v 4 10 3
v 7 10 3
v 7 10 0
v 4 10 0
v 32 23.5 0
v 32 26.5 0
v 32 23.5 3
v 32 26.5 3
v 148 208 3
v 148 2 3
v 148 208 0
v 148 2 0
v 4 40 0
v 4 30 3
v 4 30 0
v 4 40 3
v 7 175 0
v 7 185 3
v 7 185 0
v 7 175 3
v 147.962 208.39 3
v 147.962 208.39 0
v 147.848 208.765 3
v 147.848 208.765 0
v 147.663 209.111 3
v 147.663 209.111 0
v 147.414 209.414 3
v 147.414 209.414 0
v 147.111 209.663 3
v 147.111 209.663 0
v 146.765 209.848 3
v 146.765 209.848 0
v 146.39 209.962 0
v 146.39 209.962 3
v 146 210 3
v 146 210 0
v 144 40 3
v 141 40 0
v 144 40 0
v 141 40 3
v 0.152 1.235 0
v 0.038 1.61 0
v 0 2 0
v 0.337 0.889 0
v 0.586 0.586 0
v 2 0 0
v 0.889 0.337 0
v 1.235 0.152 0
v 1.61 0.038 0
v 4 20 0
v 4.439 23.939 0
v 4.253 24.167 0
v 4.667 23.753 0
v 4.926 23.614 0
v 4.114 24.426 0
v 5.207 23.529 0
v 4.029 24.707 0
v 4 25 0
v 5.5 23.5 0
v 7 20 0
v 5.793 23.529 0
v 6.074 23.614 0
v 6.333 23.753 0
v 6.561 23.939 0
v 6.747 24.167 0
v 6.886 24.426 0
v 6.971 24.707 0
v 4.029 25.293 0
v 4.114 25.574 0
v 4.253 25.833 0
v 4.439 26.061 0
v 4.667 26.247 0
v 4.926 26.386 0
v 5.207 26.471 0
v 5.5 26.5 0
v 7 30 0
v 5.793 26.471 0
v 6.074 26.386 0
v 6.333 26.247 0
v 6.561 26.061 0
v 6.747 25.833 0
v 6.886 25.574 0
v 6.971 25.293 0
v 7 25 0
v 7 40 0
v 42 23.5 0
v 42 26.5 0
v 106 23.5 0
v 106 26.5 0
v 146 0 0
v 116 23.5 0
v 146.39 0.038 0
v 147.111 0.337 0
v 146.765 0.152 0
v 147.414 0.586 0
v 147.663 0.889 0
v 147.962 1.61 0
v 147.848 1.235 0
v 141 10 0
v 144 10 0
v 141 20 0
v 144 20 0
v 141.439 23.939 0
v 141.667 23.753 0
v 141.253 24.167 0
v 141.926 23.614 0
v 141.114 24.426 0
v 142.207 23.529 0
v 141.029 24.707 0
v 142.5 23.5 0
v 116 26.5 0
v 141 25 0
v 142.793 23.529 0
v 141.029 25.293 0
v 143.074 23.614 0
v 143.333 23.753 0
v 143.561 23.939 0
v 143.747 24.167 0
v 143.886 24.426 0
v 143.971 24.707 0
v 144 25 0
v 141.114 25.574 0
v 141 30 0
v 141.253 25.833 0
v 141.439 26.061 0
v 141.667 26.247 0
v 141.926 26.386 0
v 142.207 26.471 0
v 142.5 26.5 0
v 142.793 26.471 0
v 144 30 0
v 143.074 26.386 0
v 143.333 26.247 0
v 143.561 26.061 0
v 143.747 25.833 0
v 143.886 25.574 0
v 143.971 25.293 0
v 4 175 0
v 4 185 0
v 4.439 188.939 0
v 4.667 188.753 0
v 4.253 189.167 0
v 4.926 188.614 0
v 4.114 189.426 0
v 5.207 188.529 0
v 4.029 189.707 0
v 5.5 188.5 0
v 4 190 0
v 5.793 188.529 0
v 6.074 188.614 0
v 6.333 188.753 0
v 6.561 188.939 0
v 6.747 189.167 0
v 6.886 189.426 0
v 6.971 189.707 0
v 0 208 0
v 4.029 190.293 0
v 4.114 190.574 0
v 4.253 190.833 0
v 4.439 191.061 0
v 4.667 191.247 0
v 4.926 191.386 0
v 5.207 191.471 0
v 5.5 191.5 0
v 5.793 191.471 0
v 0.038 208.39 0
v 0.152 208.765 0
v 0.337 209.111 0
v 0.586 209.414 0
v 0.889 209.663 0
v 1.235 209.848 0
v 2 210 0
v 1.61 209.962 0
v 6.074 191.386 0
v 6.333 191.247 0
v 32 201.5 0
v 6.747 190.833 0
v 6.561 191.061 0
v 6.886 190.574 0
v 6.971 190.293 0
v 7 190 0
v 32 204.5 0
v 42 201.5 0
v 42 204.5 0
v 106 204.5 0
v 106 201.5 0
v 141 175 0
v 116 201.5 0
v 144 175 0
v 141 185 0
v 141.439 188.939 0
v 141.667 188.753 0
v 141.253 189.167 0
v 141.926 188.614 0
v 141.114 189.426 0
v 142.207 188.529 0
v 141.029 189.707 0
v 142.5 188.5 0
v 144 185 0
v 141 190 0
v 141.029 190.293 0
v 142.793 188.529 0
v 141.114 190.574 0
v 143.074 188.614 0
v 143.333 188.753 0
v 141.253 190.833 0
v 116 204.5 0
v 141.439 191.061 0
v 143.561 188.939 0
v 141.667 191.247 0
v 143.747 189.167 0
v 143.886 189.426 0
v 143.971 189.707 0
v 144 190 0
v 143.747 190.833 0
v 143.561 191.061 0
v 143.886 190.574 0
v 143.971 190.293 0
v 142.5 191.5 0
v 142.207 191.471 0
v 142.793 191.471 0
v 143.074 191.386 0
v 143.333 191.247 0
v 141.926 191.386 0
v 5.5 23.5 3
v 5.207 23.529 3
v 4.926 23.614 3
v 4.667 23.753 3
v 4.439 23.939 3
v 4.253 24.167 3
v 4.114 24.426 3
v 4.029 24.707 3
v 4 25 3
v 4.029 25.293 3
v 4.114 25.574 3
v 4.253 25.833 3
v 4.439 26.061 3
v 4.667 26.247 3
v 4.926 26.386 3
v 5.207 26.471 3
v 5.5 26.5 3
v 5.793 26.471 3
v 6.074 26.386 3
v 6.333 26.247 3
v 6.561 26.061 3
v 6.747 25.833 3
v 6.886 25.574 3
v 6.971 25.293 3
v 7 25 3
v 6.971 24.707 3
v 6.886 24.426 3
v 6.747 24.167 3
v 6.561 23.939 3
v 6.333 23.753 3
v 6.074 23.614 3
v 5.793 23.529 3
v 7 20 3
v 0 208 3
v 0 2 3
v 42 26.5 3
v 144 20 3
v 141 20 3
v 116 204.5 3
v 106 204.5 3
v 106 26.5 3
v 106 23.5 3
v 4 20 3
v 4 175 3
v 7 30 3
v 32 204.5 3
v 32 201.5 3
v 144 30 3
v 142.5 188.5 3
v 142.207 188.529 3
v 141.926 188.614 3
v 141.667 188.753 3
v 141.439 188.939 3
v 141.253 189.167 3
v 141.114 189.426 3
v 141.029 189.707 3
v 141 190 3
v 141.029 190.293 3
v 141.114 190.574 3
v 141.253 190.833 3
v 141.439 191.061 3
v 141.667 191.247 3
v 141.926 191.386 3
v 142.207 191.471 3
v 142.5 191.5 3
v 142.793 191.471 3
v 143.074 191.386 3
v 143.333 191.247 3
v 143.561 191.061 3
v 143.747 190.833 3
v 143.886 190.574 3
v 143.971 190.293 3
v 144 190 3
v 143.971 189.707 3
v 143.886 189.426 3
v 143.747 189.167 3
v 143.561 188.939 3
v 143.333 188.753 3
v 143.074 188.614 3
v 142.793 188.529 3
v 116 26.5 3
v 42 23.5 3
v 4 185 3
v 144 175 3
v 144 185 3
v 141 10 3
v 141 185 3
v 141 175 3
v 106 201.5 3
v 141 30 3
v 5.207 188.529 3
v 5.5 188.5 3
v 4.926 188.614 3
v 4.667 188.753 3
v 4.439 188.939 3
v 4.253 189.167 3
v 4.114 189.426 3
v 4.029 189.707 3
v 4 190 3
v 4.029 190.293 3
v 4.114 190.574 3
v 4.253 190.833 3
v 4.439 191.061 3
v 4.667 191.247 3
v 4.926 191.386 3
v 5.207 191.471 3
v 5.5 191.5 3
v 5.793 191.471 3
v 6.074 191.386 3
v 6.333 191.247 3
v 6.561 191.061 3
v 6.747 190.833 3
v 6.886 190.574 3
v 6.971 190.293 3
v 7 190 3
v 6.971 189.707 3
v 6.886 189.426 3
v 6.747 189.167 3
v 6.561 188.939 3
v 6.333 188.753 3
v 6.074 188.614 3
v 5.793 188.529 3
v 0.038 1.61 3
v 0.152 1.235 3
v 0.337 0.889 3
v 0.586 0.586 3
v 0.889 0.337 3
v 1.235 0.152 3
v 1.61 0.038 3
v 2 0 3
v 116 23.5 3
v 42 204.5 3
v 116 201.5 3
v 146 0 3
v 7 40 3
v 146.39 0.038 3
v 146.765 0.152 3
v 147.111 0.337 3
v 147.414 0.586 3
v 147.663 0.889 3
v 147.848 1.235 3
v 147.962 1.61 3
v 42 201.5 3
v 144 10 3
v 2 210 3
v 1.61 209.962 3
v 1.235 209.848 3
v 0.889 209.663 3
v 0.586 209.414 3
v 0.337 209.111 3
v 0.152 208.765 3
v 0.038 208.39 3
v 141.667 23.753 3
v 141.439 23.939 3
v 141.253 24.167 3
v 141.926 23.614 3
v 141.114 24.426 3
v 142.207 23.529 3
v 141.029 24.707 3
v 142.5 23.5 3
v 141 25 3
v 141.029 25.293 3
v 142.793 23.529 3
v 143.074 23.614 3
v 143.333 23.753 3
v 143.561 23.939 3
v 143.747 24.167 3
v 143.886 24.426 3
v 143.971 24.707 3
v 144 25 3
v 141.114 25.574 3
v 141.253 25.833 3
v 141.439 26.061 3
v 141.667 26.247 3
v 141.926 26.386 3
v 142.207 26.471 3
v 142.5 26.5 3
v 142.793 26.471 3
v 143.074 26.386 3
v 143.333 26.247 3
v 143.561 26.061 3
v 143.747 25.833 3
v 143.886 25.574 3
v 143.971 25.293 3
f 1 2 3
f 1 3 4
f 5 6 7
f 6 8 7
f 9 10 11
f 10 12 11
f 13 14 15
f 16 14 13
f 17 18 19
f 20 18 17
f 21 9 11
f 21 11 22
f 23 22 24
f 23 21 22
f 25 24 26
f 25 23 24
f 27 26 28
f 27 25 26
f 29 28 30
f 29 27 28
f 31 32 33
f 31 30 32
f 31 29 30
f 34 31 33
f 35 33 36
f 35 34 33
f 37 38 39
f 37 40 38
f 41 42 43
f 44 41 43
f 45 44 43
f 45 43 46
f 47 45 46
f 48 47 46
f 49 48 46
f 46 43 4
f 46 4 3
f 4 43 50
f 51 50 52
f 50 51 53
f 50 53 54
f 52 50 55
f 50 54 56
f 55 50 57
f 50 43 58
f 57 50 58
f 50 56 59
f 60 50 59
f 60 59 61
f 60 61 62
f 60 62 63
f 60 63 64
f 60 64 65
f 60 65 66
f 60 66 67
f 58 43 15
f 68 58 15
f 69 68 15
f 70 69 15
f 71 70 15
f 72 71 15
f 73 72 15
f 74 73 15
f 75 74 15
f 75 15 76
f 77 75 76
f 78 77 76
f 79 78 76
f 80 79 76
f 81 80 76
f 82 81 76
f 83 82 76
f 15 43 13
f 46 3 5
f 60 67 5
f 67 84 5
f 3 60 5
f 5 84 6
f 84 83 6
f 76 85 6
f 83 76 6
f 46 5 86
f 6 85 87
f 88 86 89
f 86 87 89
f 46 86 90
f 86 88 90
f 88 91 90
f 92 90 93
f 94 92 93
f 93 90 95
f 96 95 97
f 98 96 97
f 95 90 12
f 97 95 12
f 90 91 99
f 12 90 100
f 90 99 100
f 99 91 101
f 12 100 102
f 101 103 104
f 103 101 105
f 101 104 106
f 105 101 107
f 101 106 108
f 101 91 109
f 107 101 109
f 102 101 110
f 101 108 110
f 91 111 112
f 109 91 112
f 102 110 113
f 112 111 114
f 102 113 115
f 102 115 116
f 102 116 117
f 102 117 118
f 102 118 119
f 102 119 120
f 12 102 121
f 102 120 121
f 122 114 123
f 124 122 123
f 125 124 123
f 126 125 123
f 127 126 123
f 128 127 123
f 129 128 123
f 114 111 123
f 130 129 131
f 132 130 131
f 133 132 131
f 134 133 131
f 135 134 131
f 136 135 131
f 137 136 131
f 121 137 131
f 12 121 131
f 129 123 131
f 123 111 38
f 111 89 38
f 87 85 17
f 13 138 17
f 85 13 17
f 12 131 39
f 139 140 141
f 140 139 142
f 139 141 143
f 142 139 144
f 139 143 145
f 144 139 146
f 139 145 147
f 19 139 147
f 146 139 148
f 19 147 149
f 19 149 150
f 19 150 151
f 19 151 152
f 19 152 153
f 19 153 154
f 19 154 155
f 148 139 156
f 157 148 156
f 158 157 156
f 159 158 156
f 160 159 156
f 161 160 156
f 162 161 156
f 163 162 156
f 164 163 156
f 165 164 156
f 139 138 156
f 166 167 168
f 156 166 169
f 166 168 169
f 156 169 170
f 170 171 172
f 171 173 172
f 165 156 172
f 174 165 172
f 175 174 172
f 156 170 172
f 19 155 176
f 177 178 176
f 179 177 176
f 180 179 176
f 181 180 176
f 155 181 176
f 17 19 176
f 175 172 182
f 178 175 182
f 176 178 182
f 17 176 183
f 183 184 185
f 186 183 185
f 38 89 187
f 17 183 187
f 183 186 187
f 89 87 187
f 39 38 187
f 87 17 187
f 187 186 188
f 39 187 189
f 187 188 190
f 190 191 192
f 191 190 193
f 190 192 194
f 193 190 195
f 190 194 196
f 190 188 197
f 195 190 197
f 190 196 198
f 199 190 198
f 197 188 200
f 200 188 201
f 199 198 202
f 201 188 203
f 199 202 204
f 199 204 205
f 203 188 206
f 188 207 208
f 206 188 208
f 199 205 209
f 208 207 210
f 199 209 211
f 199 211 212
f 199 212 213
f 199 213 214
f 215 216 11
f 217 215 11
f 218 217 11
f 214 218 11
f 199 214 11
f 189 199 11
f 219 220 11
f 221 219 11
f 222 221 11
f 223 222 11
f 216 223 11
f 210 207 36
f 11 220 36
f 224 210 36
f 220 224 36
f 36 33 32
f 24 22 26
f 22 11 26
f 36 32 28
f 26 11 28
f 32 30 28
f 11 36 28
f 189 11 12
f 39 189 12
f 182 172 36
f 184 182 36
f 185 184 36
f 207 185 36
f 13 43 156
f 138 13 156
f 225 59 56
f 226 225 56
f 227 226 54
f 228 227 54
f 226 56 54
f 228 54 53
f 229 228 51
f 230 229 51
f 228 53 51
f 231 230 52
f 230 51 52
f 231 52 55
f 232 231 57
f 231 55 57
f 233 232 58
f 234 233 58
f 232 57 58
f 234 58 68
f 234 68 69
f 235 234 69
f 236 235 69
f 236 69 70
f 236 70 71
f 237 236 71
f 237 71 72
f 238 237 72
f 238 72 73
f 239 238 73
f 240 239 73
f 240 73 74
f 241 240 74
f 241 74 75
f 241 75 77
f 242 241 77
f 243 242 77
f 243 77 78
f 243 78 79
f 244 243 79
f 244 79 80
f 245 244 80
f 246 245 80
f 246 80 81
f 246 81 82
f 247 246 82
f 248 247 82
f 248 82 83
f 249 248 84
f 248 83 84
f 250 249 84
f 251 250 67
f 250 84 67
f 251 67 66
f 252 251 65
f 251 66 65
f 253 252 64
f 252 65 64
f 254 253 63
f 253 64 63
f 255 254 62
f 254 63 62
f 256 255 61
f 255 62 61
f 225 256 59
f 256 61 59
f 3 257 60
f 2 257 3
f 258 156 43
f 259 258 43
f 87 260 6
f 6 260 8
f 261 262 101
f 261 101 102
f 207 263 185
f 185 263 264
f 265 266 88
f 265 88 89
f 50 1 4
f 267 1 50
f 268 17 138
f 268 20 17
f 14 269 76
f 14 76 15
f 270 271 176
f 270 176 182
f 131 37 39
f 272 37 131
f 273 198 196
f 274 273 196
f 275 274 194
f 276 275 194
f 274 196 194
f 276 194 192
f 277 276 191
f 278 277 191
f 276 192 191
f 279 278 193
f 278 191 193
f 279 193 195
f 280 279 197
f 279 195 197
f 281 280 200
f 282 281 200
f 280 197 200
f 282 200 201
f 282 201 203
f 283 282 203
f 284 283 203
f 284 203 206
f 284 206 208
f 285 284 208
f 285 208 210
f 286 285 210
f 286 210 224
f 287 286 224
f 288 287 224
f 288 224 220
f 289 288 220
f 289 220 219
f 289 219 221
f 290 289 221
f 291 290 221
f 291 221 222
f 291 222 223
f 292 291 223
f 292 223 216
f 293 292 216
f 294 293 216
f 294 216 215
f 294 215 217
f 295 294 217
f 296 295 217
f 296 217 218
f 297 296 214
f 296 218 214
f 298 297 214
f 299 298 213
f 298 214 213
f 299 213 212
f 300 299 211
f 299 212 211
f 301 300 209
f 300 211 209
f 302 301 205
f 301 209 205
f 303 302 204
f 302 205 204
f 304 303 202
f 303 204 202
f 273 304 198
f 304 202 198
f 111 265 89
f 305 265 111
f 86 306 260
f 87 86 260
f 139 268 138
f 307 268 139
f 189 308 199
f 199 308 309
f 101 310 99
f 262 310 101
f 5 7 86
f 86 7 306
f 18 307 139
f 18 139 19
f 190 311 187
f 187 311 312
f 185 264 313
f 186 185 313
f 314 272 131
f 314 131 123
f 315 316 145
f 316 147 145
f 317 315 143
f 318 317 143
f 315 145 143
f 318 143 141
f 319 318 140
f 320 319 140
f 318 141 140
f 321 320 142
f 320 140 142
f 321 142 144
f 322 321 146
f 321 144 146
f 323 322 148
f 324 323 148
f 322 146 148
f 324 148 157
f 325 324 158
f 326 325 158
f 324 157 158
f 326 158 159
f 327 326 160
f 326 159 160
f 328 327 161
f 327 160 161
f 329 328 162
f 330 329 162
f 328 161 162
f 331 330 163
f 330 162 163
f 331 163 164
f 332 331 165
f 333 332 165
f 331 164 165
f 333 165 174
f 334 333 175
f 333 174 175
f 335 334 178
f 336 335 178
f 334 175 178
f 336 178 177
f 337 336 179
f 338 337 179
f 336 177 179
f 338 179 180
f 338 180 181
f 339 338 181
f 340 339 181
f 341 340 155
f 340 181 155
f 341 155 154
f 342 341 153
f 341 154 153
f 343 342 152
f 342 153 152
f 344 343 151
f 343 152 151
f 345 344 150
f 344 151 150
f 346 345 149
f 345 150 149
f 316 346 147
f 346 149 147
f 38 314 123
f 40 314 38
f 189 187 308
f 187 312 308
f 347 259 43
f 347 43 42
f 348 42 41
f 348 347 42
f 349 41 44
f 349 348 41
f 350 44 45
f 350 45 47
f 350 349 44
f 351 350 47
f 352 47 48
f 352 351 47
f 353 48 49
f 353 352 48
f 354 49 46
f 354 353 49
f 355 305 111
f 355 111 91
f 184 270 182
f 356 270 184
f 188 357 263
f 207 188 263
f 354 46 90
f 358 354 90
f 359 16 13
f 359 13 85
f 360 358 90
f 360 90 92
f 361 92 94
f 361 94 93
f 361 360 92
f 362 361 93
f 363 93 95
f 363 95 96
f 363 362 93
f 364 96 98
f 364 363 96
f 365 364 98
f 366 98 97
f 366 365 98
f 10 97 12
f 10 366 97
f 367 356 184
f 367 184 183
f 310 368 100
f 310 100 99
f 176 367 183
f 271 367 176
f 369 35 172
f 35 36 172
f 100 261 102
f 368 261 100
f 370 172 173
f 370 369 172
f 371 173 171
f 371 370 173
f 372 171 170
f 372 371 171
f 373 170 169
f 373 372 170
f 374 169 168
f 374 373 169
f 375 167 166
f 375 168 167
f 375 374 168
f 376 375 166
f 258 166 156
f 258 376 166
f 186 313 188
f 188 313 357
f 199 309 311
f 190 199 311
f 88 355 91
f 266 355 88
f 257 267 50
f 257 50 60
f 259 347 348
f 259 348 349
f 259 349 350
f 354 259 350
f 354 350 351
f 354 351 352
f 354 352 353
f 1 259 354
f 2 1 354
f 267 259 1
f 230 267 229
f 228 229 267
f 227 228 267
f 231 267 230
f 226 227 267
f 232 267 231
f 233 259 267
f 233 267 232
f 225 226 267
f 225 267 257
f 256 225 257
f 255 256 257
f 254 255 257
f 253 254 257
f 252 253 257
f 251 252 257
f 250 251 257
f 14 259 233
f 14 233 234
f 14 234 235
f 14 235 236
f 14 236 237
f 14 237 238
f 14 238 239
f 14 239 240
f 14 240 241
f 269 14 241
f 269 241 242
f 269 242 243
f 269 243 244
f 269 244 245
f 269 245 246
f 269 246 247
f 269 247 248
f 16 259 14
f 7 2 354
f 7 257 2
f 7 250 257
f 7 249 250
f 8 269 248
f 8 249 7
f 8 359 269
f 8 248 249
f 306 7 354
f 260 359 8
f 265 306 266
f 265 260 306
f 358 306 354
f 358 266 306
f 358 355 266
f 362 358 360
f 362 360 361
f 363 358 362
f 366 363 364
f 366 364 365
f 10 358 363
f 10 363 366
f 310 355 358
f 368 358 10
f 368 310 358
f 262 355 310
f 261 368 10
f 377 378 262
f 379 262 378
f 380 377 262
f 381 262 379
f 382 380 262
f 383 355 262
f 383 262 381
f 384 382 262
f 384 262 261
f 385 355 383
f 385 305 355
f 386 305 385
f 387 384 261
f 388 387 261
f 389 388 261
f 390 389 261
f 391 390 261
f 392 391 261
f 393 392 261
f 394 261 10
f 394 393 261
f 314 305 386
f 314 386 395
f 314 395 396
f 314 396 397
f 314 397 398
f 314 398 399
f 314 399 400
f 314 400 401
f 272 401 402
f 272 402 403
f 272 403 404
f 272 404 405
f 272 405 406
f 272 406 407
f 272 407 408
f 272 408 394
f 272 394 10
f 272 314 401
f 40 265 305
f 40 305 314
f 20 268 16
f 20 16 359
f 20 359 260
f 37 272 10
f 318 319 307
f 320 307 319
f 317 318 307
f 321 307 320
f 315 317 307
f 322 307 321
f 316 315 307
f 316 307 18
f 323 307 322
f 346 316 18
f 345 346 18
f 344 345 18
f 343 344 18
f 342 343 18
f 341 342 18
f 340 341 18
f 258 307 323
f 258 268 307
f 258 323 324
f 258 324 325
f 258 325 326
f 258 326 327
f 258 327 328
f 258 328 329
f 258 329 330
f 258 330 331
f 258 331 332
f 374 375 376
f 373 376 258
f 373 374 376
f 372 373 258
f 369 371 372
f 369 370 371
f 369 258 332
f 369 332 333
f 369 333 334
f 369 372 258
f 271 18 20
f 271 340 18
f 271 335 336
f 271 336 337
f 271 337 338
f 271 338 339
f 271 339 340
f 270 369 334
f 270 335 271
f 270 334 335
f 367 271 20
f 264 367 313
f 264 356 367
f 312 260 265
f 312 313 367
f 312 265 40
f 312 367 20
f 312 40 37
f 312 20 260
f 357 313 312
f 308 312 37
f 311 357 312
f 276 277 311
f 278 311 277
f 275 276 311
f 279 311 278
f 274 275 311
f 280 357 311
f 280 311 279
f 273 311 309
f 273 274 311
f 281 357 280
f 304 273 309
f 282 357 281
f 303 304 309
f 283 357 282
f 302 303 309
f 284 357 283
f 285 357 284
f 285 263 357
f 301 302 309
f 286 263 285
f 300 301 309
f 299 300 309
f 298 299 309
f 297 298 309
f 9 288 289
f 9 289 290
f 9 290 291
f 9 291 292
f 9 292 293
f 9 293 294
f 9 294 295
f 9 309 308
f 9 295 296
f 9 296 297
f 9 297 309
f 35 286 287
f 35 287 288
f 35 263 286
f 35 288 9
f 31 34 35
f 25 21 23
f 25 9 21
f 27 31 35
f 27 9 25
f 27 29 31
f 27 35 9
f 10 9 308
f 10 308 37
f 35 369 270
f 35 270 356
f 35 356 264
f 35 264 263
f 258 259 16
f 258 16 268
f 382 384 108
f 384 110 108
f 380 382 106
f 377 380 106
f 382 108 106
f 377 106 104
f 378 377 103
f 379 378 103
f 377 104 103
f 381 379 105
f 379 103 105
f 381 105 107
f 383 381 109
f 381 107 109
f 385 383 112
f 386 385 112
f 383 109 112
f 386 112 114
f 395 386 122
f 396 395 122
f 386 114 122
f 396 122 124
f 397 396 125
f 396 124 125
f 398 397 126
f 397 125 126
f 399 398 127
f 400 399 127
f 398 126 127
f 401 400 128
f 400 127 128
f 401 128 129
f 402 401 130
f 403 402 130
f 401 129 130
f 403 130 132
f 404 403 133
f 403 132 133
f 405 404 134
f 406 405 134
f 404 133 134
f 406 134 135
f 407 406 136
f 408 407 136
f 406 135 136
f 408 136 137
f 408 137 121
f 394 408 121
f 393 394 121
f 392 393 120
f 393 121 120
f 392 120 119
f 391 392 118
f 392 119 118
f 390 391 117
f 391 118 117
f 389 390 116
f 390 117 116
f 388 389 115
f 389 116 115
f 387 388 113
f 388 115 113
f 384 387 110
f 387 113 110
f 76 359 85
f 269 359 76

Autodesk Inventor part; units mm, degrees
ref_plane "YZ Plane" through (0, 0, 0) normal (1, 0, 0) x (0, 1, 0)
ref_plane "XZ Plane" through (0, 0, 0) normal (0, 1, 0) x (-1, 0, 0)
ref_plane "XY Plane" through (0, 0, 0) normal (0, 0, 1) x (1, 0, 0)
sketch "Sketch1" plane through (0, 0, 0) normal (0, 0, 1) x (1, 0, 0)
  line L0 (0, 0) -> (148, 0)
  line L1 (148, 0) -> (148, 210)
  line L2 (148, 210) -> (0, 210)
  line L3 (0, 210) -> (0, 0)
  dimension "d0" = 148
  dimension "d1" = 210
extrude "Extrusion1" add sketch "Sketch1" along normal blind 3
sketch "Sketch2" plane through (0, 0, 3) normal (0, 0, 1) x (1, 0, 0)
  line L0 (0, 0) -> (0, 210) projected
  line L1 (148, 0) -> (0, 0) projected
  line L2 (148, 210) -> (148, 0) projected
  line L3 (0, 210) -> (148, 210) projected
  line L4 (4, 185) -> (7, 185)
  line L5 (7, 185) -> (7, 175)
  line L6 (7, 175) -> (4, 175)
  line L7 (4, 175) -> (4, 185)
  line L8 (4, 40) -> (7, 40)
  line L9 (7, 40) -> (7, 30)
  line L10 (7, 30) -> (4, 30)
  line L11 (4, 30) -> (4, 40)
  line L12 (4, 20) -> (7, 20)
  line L13 (7, 20) -> (7, 10)
  line L14 (7, 10) -> (4, 10)
  line L15 (4, 10) -> (4, 20)
  line L16 (141, 175) -> (144, 175)
  line L17 (144, 175) -> (144, 185)
  line L18 (144, 185) -> (141, 185)
  line L19 (141, 185) -> (141, 175)
  line L20 (141, 40) -> (144, 40)
  line L21 (144, 40) -> (144, 30)
  line L22 (144, 30) -> (141, 30)
  line L23 (141, 30) -> (141, 40)
  line L24 (141, 20) -> (144, 20)
  line L25 (144, 20) -> (144, 10)
  line L26 (144, 10) -> (141, 10)
  line L27 (141, 10) -> (141, 20)
  dimension "d4" = 4
  dimension "d5" = 3
  dimension "d6" = 10
  dimension "d7" = 25
  dimension "d10" = 10
  dimension "d11" = 10
  dimension "d12" = 10
  dimension "d13" = 10
  dimension "d14" = 3
  dimension "d15" = 4
  dimension "d17" = 10
  dimension "d18" = 10
  dimension "d19" = 10
  dimension "d43" = 4
  dimension "d44" = 4
  dimension "d45" = 3
  dimension "d46" = 3
  dimension "d51" = 4
  dimension "d52" = 3
  dimension "d165" = 10
  dimension "d166" = 25
  dimension "d169" = 3
extrude "Extrusion2" cut sketch "Sketch2" against normal through all contours L4 L5 L6 L7 | L8 L9 L10 L11 | L12 L13 L14 L15 | L19 L18 L17 L16 | L20 L21 L22 L23 | L24 L25 L26 L27
sketch "Sketch3" plane through (0, 0, 3) normal (0, 0, 1) x (1, 0, 0)
  line L0 (7, 30) -> (4, 30) projected
  line L1 (0, 210) -> (148, 210) projected
  line L2 (4, 175) -> (4, 185) projected
  line L3 (141, 175) -> (141, 185) projected
  line L4 (7, 40) -> (7, 30) projected
  point P0 (5.5, 190)
  point P1 (142.5, 190)
  point P2 (5.5, 25)
  point P3 (142.5, 25)
  point P4 (141, 30)
  dimension "d24" = 5
  dimension "d54" = 1.5
  dimension "d162" = 20
  dimension "d163" = 20
  dimension "d167" = 1.5
  dimension "d168" = 1.5
  dimension "d170" = 1.5
hole "Hole1" at (5.5, 190, 3) at (142.5, 190, 3) at (5.5, 25, 3) at (142.5, 25, 3) direction (0, 0, -1) diameter 3 end through all
sketch "草圖12" plane through (0, 0, 3) normal (0, 0, 1) x (1, 0, 0)
  line L0 (0, 0) -> (0, 210) projected
  line L1 (148, 0) -> (0, 0) projected
  line L2 (148, 210) -> (148, 0) projected
  line L3 (0, 210) -> (148, 210) projected
  line L4 (32, 204.5) -> (42, 204.5)
  line L5 (42, 204.5) -> (42, 201.5)
  line L6 (42, 201.5) -> (32, 201.5)
  line L7 (32, 201.5) -> (32, 204.5)
  line L8 (106, 201.5) -> (116, 201.5)
  line L9 (116, 201.5) -> (116, 204.5)
  line L10 (116, 204.5) -> (106, 204.5)
  line L11 (106, 204.5) -> (106, 201.5)
  line L12 (32, 23.5) -> (42, 23.5)
  line L13 (42, 23.5) -> (42, 26.5)
  line L14 (42, 26.5) -> (32, 26.5)
  line L15 (32, 26.5) -> (32, 23.5)
  line L16 (106, 26.5) -> (116, 26.5)
  line L17 (116, 26.5) -> (116, 23.5)
  line L18 (116, 23.5) -> (106, 23.5)
  line L19 (106, 23.5) -> (106, 26.5)
  dimension "d148" = 3
  dimension "d150" = 10
  dimension "d151" = 32
  dimension "d152" = 5.5
  dimension "d153" = 10
  dimension "d154" = 32
  dimension "d155" = 3
  dimension "d156" = 23.5
  dimension "d157" = 32
  dimension "d158" = 32
extrude "擠出5" cut sketch "草圖12" against normal through all contours L4 L5 L6 L7 | L11 L10 L9 L8 | L15 L14 L13 L12 | L16 L17 L18 L19
fillet "圓角3" radius 2 4 edges at (0, 0, 1.5) (148, 0, 1.5) (0, 210, 1.5) (148, 210, 1.5)
properties part number "plastic_part_1"
